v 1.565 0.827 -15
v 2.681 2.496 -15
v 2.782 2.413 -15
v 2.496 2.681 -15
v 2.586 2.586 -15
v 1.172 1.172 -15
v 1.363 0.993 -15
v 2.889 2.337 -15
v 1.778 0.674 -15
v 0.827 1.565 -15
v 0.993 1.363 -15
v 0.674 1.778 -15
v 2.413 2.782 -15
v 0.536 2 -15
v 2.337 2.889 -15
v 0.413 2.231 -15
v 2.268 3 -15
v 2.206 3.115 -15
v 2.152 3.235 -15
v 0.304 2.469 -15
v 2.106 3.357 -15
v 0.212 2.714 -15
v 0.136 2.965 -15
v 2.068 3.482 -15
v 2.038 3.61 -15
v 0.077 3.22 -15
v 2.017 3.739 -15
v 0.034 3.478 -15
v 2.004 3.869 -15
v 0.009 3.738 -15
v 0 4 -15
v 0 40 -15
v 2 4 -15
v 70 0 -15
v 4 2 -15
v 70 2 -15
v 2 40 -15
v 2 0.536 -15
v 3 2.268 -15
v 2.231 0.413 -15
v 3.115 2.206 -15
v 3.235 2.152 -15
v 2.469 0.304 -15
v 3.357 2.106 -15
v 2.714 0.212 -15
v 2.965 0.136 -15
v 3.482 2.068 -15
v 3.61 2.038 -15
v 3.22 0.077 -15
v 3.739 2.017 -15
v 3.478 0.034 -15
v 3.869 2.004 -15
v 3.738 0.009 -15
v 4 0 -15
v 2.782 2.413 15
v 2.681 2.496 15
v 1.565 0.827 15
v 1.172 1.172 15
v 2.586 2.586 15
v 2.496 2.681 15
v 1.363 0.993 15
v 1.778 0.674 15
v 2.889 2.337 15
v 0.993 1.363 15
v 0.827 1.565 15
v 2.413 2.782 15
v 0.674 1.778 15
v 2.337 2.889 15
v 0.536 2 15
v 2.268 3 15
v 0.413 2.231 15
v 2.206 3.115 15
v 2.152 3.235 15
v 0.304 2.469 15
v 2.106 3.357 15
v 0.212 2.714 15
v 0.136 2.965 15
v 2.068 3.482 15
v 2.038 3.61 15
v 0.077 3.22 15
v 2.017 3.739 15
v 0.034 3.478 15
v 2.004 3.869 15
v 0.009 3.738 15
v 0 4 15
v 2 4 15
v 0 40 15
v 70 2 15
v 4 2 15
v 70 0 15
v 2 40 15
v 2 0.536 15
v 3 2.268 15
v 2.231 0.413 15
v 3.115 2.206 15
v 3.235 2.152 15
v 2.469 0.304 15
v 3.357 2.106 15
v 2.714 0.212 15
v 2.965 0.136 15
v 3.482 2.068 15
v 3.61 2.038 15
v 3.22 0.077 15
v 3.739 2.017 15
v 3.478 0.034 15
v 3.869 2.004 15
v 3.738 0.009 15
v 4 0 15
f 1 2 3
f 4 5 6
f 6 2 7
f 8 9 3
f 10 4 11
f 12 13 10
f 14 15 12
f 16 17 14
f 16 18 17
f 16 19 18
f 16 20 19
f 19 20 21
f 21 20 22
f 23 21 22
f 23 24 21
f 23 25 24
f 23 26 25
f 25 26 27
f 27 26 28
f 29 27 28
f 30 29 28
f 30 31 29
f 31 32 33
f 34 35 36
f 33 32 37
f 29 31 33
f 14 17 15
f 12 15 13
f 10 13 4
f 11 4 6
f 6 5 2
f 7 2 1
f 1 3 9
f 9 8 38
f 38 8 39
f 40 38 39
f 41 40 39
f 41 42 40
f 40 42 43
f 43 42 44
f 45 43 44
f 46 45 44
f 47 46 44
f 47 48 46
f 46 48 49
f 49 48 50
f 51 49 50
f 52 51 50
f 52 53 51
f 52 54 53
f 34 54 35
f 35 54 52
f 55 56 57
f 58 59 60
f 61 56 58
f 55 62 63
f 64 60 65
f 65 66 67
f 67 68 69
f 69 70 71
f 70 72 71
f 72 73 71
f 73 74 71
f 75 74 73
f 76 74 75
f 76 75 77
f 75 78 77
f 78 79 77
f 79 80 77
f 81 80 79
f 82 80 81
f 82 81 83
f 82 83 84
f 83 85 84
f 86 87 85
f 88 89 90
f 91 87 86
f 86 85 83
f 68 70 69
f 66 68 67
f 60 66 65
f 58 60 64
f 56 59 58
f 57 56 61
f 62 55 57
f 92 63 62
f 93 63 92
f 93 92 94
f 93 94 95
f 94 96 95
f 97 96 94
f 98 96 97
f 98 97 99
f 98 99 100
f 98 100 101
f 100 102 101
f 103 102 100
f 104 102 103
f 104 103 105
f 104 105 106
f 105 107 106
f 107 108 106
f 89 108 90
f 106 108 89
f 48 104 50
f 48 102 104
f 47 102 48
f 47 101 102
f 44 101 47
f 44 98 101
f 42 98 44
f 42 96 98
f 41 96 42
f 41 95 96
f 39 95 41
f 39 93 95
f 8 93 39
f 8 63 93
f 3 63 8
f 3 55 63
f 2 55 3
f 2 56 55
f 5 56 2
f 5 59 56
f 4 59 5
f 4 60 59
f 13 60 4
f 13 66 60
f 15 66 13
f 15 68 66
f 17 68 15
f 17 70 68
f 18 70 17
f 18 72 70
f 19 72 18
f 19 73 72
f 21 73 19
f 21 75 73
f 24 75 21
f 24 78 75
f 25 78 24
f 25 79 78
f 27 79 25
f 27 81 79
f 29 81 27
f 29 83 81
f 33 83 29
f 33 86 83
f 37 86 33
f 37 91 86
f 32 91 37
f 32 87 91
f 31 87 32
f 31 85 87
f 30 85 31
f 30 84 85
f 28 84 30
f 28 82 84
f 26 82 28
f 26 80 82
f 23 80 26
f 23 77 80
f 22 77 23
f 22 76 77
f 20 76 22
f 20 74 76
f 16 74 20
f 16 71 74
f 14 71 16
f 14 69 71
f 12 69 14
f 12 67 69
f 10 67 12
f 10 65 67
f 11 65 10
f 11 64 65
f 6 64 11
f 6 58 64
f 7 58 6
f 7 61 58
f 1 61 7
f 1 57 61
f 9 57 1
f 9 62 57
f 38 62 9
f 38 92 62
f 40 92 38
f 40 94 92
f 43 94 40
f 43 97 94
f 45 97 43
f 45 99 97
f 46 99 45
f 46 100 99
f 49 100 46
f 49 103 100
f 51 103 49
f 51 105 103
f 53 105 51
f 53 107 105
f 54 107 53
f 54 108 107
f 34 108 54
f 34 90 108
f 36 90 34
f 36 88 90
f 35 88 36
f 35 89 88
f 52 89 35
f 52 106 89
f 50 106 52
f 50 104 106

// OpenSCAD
// MAKERBENCH SHEETMETAL L-BRACKET DESIGN
// Constant-thickness sheet-metal L-bracket with a single 90-degree bend

// --- Parameters ---
thickness = 2.0;       // Sheet metal thickness (t) in mm
inside_radius = 2.0;   // Inside bend radius (r_i) in mm
width = 30.0;          // Bracket width in mm
L1_outside = 70.0;     // Flange 1 outside length in mm
L2_outside = 40.0;     // Flange 2 outside length in mm
K_factor = 0.45;       // K-factor for bend allowance calculation

// --- Calculations ---
PI = 3.141592653589793;
r_o = inside_radius + thickness; // Outside bend radius
L1_leg = L1_outside - r_o;       // Leg 1 flat length
L2_leg = L2_outside - r_o;       // Leg 2 flat length

// Bend Allowance (BA) for a 90-degree bend (angle = PI/2 radians)
bend_allowance = (PI / 2) * (inside_radius + K_factor * thickness);

// Developed flat-pattern blank length
flat_length = L1_leg + L2_leg + bend_allowance;

// --- Manifest Echo ---
echo(str("MAKERBENCH-SHEETMETAL: {\"thickness_mm\": ", thickness, ", \"bend_radius_mm\": ", inside_radius, ", \"flat_length_mm\": ", flat_length, "}"));

// --- 2D Profile Module ---
module bracket_2d() {
    // Flange 1: Horizontal leg along X-axis
    translate([r_o, 0])
        square([L1_leg, thickness]);

    // Flange 2: Vertical leg along Y-axis
    translate([0, r_o])
        square([thickness, L2_leg]);

    // 90-degree Bend: Annulus segment in bottom-left quadrant relative to bend center
    intersection() {
        square([r_o, r_o]);
        difference() {
            translate([r_o, r_o])
                circle(r = r_o, $fn = 96);
            translate([r_o, r_o])
                circle(r = inside_radius, $fn = 96);
        }
    }
}

// --- 3D Extrusion ---
linear_extrude(height = width, center = true) {
    bracket_2d();
}
